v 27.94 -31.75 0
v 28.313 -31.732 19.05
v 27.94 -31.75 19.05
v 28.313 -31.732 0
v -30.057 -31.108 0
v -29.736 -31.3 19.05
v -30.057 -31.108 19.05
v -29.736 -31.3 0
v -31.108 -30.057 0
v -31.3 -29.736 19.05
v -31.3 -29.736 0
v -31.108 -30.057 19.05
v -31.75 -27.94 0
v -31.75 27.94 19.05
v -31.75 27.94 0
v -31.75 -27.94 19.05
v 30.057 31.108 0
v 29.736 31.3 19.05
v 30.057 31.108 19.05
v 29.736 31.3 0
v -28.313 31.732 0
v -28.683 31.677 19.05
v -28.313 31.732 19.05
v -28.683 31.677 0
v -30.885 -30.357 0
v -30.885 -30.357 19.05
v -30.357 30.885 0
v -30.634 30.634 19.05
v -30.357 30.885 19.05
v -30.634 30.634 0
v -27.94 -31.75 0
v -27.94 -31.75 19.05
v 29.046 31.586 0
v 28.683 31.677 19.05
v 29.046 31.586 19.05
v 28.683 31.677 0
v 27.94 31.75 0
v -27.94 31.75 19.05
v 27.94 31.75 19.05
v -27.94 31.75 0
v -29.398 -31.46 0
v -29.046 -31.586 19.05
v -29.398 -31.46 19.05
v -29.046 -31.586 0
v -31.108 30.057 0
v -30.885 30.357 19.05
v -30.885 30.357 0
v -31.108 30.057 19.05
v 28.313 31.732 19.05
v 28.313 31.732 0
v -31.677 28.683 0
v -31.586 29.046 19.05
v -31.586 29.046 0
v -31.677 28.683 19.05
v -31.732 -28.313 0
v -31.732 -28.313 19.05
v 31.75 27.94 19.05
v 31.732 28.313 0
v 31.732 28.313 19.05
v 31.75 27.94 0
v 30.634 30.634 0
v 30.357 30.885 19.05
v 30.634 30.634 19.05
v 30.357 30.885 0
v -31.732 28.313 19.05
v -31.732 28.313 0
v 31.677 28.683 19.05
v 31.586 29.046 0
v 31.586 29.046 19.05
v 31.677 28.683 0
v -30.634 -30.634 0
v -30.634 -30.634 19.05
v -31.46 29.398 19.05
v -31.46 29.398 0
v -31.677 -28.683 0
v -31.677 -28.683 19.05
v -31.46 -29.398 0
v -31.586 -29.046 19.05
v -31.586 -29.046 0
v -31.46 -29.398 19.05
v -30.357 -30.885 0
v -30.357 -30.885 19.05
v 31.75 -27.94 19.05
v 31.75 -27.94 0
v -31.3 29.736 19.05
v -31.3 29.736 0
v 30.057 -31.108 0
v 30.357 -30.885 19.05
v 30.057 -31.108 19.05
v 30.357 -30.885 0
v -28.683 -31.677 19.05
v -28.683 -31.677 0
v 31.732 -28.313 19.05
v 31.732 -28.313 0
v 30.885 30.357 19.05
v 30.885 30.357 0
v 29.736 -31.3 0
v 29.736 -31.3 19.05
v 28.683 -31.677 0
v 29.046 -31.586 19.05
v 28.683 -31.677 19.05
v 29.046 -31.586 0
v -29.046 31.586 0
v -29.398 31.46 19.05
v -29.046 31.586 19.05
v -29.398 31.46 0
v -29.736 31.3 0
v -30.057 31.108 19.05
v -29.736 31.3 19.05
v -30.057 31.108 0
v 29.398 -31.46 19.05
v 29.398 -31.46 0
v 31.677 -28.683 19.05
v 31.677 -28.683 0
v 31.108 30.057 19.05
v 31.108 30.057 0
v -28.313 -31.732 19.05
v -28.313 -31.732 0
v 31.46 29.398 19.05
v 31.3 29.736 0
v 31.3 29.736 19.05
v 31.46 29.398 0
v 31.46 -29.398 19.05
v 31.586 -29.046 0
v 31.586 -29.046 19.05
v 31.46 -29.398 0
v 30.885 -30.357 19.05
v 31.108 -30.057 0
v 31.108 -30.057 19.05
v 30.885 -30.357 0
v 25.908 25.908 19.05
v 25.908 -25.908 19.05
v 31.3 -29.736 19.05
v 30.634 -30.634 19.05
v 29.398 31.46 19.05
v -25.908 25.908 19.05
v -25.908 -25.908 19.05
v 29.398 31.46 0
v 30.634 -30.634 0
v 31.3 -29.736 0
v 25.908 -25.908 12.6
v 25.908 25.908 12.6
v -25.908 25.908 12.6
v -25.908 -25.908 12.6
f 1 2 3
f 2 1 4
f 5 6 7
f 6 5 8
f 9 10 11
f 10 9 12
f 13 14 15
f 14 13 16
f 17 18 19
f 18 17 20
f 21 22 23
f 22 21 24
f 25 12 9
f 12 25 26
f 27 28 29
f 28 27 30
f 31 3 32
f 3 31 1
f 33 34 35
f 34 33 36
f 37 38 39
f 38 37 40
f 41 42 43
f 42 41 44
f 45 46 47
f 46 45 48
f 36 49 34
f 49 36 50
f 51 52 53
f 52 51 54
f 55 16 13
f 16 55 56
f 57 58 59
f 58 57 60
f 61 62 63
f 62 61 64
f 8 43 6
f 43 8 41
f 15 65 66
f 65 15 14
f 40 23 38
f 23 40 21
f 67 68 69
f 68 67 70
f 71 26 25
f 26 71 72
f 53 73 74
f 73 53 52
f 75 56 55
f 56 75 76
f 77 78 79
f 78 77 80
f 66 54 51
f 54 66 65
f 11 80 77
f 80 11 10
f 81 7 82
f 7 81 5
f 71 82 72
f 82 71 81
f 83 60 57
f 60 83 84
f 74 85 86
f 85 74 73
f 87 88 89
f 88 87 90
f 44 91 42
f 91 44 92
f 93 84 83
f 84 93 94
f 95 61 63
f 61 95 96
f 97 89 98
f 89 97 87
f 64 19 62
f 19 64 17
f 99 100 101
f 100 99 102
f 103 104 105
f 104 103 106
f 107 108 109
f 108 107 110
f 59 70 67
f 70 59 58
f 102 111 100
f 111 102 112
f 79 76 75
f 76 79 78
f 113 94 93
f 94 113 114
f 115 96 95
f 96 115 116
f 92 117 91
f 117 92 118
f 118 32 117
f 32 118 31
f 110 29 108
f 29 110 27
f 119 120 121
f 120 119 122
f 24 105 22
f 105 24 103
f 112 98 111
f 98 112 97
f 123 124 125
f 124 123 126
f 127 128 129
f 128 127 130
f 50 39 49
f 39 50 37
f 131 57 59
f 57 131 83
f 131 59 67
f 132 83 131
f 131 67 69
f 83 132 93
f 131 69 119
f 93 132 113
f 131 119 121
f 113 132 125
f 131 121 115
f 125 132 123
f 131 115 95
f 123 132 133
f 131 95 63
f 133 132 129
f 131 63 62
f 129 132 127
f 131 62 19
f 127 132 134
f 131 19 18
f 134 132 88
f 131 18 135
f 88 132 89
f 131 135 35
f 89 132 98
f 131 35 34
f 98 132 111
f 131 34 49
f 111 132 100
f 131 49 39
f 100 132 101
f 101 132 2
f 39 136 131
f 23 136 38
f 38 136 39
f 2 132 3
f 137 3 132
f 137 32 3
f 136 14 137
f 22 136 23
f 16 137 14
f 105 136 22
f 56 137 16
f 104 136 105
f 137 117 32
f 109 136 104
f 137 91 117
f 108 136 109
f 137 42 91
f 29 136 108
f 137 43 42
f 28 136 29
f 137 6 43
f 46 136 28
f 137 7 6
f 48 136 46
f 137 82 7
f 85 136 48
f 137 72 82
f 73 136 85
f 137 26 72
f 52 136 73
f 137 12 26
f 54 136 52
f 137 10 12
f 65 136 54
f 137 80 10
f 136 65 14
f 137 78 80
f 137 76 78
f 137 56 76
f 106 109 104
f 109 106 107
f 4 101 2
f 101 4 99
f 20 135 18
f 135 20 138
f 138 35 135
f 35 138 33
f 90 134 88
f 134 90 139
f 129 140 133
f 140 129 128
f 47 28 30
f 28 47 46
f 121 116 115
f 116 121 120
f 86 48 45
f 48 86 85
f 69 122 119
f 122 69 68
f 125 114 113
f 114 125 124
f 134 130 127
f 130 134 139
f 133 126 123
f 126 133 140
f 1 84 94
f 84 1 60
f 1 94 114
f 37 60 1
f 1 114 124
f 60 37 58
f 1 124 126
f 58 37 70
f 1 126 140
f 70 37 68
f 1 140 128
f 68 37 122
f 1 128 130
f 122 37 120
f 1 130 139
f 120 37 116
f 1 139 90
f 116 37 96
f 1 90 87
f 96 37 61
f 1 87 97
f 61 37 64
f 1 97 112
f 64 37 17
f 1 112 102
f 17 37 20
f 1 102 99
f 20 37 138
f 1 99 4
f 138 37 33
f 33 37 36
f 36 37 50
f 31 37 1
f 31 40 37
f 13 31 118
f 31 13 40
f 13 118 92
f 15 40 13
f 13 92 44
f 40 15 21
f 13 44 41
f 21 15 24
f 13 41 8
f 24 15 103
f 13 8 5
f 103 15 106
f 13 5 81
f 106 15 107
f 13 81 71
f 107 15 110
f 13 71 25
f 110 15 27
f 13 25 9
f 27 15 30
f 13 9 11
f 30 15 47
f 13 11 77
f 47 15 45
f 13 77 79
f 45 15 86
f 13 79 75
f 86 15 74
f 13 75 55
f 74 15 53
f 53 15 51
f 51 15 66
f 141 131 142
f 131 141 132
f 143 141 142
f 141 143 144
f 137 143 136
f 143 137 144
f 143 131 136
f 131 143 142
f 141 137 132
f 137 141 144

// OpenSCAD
inch = 25.4;

// Overall pad
pad_x = 2.50 * inch;
pad_y = 2.50 * inch;

// You want 1/2" of material beneath the leg
under_leg_height = 0.50 * inch;

// Recess depth
recess_depth = 0.25   * inch;

// Total height
pad_height = under_leg_height + recess_depth;

// Actual workbench foot size
leg_x = 2.00 * inch;
leg_y = 2.00 * inch;

// Clearance on each side
clearance = 0.02 * inch;

// Rounded outside corners
corner_radius = 0.15 * inch;

$fn = 64;

module rounded_box(size=[10,10,10], r=2) {
    linear_extrude(height=size[2])
        offset(r=r)
            offset(delta=-r)
                square([size[0], size[1]], center=true);
}

difference() {

    rounded_box(
        [pad_x, pad_y, pad_height],
        corner_radius
    );

    // Recess from the top
    translate([
        0,
        0,
        pad_height - recess_depth/2
    ])
        cube([
            leg_x + 2*clearance,
            leg_y + 2*clearance,
            recess_depth + 0.2
        ], center=true);
}
